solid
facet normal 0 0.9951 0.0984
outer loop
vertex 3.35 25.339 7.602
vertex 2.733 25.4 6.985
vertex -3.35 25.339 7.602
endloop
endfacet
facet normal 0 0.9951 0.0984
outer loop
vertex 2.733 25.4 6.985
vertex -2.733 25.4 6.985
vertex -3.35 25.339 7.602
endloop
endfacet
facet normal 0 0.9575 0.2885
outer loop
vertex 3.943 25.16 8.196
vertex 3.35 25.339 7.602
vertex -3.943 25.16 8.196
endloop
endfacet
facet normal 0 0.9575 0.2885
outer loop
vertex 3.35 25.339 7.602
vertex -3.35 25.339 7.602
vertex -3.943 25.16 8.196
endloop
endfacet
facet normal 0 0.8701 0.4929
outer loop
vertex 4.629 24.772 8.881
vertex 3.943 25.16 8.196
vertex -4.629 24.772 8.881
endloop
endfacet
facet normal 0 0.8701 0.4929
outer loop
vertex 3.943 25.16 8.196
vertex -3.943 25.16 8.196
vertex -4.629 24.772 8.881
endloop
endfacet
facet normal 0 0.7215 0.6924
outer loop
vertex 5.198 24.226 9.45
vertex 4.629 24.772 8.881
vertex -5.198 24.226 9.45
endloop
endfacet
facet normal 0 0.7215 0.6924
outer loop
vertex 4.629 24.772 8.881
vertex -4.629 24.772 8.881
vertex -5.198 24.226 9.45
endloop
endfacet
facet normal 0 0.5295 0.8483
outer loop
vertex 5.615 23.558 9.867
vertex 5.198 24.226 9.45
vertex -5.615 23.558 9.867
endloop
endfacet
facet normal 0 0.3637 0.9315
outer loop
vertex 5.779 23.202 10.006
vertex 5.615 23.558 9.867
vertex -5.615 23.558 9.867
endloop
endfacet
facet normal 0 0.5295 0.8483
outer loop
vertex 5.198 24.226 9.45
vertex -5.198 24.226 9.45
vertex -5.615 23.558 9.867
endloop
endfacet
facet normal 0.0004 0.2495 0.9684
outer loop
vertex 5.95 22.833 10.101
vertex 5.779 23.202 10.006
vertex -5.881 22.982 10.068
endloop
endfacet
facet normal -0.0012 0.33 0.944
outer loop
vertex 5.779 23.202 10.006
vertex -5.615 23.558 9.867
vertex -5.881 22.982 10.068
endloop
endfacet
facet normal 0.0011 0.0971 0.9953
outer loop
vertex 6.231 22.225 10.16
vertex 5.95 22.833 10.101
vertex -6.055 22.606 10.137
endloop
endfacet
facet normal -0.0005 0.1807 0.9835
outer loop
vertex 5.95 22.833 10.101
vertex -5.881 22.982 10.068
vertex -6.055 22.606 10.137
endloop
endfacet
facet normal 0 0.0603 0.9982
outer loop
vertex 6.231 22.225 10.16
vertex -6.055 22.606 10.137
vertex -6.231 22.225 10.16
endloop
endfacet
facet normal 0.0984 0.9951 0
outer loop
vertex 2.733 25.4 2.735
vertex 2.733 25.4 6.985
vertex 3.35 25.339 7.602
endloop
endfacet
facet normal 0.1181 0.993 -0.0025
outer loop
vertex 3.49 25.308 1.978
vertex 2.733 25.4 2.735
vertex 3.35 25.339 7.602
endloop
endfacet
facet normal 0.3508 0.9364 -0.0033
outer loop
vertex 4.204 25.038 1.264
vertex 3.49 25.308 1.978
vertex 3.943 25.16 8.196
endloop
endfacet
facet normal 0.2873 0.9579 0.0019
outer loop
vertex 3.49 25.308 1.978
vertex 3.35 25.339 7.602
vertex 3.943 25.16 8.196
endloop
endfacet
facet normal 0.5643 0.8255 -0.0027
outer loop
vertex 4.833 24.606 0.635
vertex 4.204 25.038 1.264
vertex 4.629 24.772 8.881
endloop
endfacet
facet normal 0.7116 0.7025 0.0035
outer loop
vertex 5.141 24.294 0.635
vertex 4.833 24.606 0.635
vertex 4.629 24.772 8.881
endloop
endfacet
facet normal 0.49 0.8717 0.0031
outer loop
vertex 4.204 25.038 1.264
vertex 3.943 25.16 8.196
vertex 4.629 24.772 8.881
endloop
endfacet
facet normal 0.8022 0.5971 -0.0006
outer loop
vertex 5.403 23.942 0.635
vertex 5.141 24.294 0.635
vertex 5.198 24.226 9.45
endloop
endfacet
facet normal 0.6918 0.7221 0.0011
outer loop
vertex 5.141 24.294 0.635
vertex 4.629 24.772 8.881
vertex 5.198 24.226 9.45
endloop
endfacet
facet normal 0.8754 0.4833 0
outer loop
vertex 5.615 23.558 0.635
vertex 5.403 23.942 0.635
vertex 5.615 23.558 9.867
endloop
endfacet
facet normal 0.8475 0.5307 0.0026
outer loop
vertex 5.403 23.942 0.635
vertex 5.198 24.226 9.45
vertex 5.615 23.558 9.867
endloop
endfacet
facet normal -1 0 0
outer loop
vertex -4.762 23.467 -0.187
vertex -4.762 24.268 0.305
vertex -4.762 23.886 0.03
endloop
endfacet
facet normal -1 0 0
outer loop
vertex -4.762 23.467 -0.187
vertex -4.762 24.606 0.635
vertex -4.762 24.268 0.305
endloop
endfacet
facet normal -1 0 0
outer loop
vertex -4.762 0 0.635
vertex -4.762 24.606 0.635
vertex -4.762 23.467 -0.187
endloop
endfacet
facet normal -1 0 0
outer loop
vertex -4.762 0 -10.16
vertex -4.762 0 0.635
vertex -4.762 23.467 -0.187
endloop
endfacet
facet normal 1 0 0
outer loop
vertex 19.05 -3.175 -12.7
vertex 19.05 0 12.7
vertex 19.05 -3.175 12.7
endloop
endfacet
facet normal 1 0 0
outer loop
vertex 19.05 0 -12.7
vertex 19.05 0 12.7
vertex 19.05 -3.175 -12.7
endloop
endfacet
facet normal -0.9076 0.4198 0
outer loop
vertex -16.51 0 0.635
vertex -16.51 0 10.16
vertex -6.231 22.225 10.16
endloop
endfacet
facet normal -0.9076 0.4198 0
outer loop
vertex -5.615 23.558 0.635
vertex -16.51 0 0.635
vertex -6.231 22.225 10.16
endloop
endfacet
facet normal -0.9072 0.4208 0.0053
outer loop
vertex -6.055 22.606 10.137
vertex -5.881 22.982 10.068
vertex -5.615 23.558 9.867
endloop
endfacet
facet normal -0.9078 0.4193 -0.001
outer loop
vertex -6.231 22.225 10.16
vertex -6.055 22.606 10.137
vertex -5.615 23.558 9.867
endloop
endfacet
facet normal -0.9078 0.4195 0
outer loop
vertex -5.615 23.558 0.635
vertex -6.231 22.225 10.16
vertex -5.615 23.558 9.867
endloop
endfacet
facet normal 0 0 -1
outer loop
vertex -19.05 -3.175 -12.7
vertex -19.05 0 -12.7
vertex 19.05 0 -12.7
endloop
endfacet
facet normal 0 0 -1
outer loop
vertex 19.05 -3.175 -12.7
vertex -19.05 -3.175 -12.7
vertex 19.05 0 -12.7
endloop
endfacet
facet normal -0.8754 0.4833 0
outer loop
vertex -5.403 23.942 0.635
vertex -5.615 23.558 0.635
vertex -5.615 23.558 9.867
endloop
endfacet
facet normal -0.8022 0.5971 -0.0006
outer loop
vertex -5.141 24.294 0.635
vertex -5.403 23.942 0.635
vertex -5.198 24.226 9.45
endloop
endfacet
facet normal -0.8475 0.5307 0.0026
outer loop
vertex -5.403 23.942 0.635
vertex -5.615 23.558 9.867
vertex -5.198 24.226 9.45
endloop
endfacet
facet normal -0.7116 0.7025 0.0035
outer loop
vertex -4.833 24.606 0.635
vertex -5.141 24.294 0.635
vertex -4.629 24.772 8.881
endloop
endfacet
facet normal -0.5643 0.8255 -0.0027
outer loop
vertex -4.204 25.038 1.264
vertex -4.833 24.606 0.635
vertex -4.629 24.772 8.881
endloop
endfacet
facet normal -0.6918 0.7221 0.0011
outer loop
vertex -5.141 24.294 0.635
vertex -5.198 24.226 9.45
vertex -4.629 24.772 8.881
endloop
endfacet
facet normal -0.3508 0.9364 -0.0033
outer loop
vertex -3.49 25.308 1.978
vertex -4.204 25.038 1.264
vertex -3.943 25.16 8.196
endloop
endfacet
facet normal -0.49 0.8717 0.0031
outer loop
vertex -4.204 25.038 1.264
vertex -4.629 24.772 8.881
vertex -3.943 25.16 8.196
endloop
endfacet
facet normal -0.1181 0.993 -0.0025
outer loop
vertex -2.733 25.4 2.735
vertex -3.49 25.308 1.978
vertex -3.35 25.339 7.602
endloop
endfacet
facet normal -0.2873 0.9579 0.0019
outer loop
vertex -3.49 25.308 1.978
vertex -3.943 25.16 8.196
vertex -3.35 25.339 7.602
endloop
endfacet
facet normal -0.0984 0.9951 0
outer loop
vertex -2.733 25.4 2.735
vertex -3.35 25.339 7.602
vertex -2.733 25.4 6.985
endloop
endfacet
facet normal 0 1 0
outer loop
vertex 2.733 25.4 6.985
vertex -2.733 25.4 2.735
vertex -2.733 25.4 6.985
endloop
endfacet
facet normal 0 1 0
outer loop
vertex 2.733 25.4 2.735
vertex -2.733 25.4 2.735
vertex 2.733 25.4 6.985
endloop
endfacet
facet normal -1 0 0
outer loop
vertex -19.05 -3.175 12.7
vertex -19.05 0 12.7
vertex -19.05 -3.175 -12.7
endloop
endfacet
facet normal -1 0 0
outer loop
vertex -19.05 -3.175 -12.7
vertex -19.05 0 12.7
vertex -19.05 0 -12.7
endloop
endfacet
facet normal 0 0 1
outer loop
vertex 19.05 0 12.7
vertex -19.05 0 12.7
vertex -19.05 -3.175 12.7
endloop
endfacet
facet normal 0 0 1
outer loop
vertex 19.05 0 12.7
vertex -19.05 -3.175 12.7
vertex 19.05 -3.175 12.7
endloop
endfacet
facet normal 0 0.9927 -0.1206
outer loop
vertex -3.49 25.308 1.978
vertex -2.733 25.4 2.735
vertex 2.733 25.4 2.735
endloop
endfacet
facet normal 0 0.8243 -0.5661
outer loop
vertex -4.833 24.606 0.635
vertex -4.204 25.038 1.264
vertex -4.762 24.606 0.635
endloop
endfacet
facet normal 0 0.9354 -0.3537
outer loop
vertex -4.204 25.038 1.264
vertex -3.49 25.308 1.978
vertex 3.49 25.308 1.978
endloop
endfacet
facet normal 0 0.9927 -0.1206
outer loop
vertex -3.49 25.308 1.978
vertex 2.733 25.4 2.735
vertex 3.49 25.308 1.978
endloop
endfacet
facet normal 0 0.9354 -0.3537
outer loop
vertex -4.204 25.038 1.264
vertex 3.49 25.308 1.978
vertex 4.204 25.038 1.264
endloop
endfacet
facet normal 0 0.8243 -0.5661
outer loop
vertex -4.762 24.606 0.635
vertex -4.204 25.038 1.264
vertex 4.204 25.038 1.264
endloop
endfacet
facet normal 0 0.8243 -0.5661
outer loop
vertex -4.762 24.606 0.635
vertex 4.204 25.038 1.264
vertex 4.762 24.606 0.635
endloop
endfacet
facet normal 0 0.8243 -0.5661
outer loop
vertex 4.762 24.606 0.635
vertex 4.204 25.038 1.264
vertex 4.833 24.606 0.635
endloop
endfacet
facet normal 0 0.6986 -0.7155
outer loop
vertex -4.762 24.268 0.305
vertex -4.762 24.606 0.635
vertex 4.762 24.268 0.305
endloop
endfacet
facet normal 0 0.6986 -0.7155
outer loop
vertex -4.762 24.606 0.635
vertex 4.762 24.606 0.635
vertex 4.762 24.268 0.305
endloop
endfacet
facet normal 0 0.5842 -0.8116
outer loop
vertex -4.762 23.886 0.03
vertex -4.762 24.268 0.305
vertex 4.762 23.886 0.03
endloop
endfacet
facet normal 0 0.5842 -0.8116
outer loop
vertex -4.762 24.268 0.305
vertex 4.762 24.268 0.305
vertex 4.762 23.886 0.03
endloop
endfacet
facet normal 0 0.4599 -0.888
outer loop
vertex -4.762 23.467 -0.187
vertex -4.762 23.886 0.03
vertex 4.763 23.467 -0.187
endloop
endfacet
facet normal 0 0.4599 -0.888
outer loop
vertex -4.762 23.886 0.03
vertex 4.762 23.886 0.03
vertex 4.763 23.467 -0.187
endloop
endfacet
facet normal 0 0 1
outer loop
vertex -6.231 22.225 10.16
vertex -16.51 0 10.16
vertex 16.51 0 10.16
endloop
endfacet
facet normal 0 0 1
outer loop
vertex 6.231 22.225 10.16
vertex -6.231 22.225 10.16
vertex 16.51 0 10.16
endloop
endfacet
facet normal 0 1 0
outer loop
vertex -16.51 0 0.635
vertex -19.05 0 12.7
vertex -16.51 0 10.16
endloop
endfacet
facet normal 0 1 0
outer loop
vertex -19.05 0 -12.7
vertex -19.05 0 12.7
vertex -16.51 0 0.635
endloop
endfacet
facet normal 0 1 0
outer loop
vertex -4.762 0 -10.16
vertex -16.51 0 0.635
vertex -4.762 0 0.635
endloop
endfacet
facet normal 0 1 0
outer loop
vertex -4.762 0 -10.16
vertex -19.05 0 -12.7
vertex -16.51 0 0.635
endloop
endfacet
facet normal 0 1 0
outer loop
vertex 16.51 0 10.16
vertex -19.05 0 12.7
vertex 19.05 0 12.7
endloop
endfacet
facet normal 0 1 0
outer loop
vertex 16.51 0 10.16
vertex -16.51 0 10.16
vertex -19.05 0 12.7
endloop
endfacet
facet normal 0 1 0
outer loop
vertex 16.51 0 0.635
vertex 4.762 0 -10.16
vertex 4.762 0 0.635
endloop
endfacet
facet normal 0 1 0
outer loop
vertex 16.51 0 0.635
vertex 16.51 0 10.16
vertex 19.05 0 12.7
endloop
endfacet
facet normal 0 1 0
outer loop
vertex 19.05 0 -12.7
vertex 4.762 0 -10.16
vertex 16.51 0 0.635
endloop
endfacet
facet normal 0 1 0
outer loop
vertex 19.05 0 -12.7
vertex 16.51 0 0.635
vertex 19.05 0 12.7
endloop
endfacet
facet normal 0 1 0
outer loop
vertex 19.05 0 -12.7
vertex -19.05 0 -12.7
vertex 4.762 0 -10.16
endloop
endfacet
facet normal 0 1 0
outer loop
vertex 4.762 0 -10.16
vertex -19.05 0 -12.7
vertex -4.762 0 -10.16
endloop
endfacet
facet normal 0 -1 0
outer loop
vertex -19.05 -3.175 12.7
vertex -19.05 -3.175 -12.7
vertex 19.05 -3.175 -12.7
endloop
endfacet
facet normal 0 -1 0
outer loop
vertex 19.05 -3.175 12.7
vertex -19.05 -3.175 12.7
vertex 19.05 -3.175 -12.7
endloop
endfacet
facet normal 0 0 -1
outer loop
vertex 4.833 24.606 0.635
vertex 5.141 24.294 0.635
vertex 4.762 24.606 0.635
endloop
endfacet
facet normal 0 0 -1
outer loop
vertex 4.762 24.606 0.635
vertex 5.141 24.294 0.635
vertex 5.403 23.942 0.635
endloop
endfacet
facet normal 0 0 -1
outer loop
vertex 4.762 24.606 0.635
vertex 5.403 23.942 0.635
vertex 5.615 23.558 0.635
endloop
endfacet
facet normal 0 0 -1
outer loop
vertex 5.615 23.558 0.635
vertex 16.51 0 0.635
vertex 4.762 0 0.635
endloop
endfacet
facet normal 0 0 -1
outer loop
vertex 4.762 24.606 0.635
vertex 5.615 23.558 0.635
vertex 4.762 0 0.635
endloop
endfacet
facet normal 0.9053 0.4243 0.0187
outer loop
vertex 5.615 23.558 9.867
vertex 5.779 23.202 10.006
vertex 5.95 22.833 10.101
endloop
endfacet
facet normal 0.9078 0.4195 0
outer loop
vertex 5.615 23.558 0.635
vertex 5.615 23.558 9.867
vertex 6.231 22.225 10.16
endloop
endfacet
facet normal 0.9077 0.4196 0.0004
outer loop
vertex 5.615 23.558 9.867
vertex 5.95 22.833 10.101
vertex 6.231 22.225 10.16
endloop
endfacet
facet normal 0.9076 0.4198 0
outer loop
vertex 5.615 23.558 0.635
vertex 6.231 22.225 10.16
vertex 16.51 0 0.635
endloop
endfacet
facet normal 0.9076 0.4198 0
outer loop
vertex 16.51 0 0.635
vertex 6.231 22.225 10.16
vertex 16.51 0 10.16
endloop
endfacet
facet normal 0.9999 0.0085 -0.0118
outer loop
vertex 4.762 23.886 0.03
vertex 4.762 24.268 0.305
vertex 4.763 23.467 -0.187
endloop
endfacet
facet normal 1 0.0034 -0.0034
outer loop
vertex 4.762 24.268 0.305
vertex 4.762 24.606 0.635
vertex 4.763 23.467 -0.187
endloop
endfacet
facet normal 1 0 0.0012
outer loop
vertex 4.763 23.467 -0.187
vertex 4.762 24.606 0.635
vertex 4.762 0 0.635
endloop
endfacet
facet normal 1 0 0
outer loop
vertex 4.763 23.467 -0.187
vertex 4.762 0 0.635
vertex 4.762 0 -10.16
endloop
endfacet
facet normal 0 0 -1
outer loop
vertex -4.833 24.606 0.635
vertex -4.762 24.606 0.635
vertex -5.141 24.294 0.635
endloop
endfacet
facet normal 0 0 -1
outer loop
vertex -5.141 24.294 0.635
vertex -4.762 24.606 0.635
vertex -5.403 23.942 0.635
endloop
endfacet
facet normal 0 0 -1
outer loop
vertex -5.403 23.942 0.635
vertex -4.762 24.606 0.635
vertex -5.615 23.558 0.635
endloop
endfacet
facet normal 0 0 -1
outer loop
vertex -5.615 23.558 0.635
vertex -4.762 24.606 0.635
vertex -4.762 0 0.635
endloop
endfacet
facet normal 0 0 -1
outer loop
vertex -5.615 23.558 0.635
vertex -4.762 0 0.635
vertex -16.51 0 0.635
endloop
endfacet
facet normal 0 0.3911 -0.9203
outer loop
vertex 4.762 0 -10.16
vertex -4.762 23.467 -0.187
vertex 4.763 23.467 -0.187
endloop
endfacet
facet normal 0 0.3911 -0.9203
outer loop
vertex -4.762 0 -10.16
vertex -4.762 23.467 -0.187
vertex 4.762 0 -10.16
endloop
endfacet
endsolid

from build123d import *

# Parameters (mm, degrees)
SKETCH1_W               = 38.1
SKETCH1_H               = 25.4
SKETCH1_W_2             = 33.02
SKETCH1_H_2             = 20.32
SKETCH1_W_3             = 11.7475
SKETCH1_H_3             = 10.795
SKETCH1_W_4             = 9.525
BOSS_EXTRUDE1_DEPTH     = 3.175
SKETCH1_3_W             = 9.525
SKETCH1_3_H             = 10.795
BOSS_EXTRUDE2_DEPTH     = 25.4
CUT_EXTRUDE1_DEPTH      = 40.123421374
CUT_EXTRUDE2_DEPTH      = 38.060560658
CUT_EXTRUDE2_DEPTH_BACK = 38.060560658
FILLET7_R               = 3.175


with BuildPart() as part:
    # Sketch1 → Boss-Extrude1 (new body)
    # profile 1 of 5: a face of its own
    with BuildSketch(Plane(origin=(0, 0, 0), x_dir=(1, 0, 0), z_dir=(0, 1, 0))):
        Rectangle(SKETCH1_W, SKETCH1_H)
        Rectangle(SKETCH1_W_2, SKETCH1_H_2, mode=Mode.SUBTRACT)
    # profile 2 of 5: a face of its own
    with BuildSketch(Plane(origin=(0, 0, 0), x_dir=(1, 0, 0), z_dir=(0, 1, 0))):
        with Locations((-10.63625, 4.7625)):
            Rectangle(SKETCH1_W_3, SKETCH1_H_3)
    # profile 3 of 5: a face of its own
    with BuildSketch(Plane(origin=(0, 0, 0), x_dir=(1, 0, 0), z_dir=(0, 1, 0))):
        with Locations((10.63625, 4.7625)):
            Rectangle(SKETCH1_W_3, SKETCH1_H_3)
    # profile 4 of 5: a face of its own
    with BuildSketch(Plane(origin=(0, 0, 0), x_dir=(1, 0, 0), z_dir=(0, 1, 0))):
        with Locations((0, 4.7625)):
            Rectangle(SKETCH1_W_4, SKETCH1_H_3)
    # profile 5 of 5: a face of its own
    with BuildSketch(Plane(origin=(0, 0, 0), x_dir=(1, 0, 0), z_dir=(0, 1, 0))):
        Polygon((-4.7625, -0.635), (-16.51, -0.635), (-16.51, -10.16), (16.51, -10.16), (16.51, -0.635), (4.7625, -0.635), align=None)
    extrude(amount=-BOSS_EXTRUDE1_DEPTH)

    # Sketch1<3> → Boss-Extrude2 (add)
    with BuildSketch(Plane(origin=(0, 0, 0), x_dir=(1, 0, 0), z_dir=(0, 1, 0))):
        with Locations((0, 4.7625)):
            Rectangle(SKETCH1_3_W, SKETCH1_3_H)
        Polygon((-4.7625, -0.635), (-16.51, -0.635), (-16.51, -10.16), (16.51, -10.16), (16.51, -0.635), (4.7625, -0.635), align=None)
    extrude(amount=BOSS_EXTRUDE2_DEPTH)

    # Sketch2 → Cut-Extrude1 (cut, through all)
    with BuildSketch(Plane.XY.offset(10.16)):
        Polygon((-16.51, 25.4), (-16.51, 0), (-4.7625, 25.4), align=None)
        Polygon((4.7625, 25.4), (16.51, 0), (16.51, 25.4), align=None)
    extrude(amount=-CUT_EXTRUDE1_DEPTH, mode=Mode.SUBTRACT)

    # Sketch3 → Cut-Extrude2 (cut, two sides: drawn at the far end of the back side and taken through both)
    with BuildSketch(Plane(origin=(4.7625, 0, 0), x_dir=(0, 0, -1), z_dir=(1, 0, 0)).offset(-CUT_EXTRUDE2_DEPTH_BACK)):
        Polygon((-0.635, 25.4), (10.16, 0), (10.16, 25.4), align=None)
    extrude(amount=CUT_EXTRUDE2_DEPTH + CUT_EXTRUDE2_DEPTH_BACK, mode=Mode.SUBTRACT)

    # Fillet7
    # the kernel refuses this fillet: 3.175 mm, written as the material it takes off along each edge
    with BuildSketch(Plane(origin=(-12.7, 25.4, 10.16), x_dir=(0, 0, -1), z_dir=(1, 0, 0))) as fillet7_piece_1:
        with BuildLine():
            CenterArc((FILLET7_R, -FILLET7_R), FILLET7_R, 90, 90)
            Line((0, -FILLET7_R), (0, 0))
            Line((0, 0), (FILLET7_R, 0))
        make_face()
    extrude(amount=25.4, mode=Mode.SUBTRACT)
    with BuildSketch(Plane(origin=(-4.7625, 25.4, 15.234238466), x_dir=(1, 0, 0), z_dir=(0, 0, -1)), Plane(origin=(4.7625, 25.4, 15.234238466), x_dir=(0.4197775063604339, -0.9076270407793146, 0), z_dir=(0, 0, -1))) as fillet7_piece_2:
        with BuildLine():
            CenterArc((FILLET7_R * 0.639274137471, FILLET7_R), FILLET7_R, 204.820541335, 65.179458665)
            Line((-FILLET7_R * 0.268352903308, FILLET7_R * 0.58022249364), (0, 0))
            Line((0, 0), (FILLET7_R * 0.639274137471, 0))
        make_face()
    extrude(amount=19.673476932, mode=Mode.SUBTRACT)
    with BuildSketch(Plane(origin=(10.013677669, 25.4, 0.635), x_dir=(0, 0, 1), z_dir=(-1, 0, 0))) as fillet7_piece_3:
        with BuildLine():
            CenterArc((FILLET7_R * 0.661565690605, -FILLET7_R), FILLET7_R, 90, 66.974507991)
            Line((-FILLET7_R * 0.258765227853, -FILLET7_R * 0.608859359655), (0, 0))
            Line((0, 0), (FILLET7_R * 0.661565690605, 0))
        make_face()
    extrude(amount=20.027355338, mode=Mode.SUBTRACT)


solid = part.part
